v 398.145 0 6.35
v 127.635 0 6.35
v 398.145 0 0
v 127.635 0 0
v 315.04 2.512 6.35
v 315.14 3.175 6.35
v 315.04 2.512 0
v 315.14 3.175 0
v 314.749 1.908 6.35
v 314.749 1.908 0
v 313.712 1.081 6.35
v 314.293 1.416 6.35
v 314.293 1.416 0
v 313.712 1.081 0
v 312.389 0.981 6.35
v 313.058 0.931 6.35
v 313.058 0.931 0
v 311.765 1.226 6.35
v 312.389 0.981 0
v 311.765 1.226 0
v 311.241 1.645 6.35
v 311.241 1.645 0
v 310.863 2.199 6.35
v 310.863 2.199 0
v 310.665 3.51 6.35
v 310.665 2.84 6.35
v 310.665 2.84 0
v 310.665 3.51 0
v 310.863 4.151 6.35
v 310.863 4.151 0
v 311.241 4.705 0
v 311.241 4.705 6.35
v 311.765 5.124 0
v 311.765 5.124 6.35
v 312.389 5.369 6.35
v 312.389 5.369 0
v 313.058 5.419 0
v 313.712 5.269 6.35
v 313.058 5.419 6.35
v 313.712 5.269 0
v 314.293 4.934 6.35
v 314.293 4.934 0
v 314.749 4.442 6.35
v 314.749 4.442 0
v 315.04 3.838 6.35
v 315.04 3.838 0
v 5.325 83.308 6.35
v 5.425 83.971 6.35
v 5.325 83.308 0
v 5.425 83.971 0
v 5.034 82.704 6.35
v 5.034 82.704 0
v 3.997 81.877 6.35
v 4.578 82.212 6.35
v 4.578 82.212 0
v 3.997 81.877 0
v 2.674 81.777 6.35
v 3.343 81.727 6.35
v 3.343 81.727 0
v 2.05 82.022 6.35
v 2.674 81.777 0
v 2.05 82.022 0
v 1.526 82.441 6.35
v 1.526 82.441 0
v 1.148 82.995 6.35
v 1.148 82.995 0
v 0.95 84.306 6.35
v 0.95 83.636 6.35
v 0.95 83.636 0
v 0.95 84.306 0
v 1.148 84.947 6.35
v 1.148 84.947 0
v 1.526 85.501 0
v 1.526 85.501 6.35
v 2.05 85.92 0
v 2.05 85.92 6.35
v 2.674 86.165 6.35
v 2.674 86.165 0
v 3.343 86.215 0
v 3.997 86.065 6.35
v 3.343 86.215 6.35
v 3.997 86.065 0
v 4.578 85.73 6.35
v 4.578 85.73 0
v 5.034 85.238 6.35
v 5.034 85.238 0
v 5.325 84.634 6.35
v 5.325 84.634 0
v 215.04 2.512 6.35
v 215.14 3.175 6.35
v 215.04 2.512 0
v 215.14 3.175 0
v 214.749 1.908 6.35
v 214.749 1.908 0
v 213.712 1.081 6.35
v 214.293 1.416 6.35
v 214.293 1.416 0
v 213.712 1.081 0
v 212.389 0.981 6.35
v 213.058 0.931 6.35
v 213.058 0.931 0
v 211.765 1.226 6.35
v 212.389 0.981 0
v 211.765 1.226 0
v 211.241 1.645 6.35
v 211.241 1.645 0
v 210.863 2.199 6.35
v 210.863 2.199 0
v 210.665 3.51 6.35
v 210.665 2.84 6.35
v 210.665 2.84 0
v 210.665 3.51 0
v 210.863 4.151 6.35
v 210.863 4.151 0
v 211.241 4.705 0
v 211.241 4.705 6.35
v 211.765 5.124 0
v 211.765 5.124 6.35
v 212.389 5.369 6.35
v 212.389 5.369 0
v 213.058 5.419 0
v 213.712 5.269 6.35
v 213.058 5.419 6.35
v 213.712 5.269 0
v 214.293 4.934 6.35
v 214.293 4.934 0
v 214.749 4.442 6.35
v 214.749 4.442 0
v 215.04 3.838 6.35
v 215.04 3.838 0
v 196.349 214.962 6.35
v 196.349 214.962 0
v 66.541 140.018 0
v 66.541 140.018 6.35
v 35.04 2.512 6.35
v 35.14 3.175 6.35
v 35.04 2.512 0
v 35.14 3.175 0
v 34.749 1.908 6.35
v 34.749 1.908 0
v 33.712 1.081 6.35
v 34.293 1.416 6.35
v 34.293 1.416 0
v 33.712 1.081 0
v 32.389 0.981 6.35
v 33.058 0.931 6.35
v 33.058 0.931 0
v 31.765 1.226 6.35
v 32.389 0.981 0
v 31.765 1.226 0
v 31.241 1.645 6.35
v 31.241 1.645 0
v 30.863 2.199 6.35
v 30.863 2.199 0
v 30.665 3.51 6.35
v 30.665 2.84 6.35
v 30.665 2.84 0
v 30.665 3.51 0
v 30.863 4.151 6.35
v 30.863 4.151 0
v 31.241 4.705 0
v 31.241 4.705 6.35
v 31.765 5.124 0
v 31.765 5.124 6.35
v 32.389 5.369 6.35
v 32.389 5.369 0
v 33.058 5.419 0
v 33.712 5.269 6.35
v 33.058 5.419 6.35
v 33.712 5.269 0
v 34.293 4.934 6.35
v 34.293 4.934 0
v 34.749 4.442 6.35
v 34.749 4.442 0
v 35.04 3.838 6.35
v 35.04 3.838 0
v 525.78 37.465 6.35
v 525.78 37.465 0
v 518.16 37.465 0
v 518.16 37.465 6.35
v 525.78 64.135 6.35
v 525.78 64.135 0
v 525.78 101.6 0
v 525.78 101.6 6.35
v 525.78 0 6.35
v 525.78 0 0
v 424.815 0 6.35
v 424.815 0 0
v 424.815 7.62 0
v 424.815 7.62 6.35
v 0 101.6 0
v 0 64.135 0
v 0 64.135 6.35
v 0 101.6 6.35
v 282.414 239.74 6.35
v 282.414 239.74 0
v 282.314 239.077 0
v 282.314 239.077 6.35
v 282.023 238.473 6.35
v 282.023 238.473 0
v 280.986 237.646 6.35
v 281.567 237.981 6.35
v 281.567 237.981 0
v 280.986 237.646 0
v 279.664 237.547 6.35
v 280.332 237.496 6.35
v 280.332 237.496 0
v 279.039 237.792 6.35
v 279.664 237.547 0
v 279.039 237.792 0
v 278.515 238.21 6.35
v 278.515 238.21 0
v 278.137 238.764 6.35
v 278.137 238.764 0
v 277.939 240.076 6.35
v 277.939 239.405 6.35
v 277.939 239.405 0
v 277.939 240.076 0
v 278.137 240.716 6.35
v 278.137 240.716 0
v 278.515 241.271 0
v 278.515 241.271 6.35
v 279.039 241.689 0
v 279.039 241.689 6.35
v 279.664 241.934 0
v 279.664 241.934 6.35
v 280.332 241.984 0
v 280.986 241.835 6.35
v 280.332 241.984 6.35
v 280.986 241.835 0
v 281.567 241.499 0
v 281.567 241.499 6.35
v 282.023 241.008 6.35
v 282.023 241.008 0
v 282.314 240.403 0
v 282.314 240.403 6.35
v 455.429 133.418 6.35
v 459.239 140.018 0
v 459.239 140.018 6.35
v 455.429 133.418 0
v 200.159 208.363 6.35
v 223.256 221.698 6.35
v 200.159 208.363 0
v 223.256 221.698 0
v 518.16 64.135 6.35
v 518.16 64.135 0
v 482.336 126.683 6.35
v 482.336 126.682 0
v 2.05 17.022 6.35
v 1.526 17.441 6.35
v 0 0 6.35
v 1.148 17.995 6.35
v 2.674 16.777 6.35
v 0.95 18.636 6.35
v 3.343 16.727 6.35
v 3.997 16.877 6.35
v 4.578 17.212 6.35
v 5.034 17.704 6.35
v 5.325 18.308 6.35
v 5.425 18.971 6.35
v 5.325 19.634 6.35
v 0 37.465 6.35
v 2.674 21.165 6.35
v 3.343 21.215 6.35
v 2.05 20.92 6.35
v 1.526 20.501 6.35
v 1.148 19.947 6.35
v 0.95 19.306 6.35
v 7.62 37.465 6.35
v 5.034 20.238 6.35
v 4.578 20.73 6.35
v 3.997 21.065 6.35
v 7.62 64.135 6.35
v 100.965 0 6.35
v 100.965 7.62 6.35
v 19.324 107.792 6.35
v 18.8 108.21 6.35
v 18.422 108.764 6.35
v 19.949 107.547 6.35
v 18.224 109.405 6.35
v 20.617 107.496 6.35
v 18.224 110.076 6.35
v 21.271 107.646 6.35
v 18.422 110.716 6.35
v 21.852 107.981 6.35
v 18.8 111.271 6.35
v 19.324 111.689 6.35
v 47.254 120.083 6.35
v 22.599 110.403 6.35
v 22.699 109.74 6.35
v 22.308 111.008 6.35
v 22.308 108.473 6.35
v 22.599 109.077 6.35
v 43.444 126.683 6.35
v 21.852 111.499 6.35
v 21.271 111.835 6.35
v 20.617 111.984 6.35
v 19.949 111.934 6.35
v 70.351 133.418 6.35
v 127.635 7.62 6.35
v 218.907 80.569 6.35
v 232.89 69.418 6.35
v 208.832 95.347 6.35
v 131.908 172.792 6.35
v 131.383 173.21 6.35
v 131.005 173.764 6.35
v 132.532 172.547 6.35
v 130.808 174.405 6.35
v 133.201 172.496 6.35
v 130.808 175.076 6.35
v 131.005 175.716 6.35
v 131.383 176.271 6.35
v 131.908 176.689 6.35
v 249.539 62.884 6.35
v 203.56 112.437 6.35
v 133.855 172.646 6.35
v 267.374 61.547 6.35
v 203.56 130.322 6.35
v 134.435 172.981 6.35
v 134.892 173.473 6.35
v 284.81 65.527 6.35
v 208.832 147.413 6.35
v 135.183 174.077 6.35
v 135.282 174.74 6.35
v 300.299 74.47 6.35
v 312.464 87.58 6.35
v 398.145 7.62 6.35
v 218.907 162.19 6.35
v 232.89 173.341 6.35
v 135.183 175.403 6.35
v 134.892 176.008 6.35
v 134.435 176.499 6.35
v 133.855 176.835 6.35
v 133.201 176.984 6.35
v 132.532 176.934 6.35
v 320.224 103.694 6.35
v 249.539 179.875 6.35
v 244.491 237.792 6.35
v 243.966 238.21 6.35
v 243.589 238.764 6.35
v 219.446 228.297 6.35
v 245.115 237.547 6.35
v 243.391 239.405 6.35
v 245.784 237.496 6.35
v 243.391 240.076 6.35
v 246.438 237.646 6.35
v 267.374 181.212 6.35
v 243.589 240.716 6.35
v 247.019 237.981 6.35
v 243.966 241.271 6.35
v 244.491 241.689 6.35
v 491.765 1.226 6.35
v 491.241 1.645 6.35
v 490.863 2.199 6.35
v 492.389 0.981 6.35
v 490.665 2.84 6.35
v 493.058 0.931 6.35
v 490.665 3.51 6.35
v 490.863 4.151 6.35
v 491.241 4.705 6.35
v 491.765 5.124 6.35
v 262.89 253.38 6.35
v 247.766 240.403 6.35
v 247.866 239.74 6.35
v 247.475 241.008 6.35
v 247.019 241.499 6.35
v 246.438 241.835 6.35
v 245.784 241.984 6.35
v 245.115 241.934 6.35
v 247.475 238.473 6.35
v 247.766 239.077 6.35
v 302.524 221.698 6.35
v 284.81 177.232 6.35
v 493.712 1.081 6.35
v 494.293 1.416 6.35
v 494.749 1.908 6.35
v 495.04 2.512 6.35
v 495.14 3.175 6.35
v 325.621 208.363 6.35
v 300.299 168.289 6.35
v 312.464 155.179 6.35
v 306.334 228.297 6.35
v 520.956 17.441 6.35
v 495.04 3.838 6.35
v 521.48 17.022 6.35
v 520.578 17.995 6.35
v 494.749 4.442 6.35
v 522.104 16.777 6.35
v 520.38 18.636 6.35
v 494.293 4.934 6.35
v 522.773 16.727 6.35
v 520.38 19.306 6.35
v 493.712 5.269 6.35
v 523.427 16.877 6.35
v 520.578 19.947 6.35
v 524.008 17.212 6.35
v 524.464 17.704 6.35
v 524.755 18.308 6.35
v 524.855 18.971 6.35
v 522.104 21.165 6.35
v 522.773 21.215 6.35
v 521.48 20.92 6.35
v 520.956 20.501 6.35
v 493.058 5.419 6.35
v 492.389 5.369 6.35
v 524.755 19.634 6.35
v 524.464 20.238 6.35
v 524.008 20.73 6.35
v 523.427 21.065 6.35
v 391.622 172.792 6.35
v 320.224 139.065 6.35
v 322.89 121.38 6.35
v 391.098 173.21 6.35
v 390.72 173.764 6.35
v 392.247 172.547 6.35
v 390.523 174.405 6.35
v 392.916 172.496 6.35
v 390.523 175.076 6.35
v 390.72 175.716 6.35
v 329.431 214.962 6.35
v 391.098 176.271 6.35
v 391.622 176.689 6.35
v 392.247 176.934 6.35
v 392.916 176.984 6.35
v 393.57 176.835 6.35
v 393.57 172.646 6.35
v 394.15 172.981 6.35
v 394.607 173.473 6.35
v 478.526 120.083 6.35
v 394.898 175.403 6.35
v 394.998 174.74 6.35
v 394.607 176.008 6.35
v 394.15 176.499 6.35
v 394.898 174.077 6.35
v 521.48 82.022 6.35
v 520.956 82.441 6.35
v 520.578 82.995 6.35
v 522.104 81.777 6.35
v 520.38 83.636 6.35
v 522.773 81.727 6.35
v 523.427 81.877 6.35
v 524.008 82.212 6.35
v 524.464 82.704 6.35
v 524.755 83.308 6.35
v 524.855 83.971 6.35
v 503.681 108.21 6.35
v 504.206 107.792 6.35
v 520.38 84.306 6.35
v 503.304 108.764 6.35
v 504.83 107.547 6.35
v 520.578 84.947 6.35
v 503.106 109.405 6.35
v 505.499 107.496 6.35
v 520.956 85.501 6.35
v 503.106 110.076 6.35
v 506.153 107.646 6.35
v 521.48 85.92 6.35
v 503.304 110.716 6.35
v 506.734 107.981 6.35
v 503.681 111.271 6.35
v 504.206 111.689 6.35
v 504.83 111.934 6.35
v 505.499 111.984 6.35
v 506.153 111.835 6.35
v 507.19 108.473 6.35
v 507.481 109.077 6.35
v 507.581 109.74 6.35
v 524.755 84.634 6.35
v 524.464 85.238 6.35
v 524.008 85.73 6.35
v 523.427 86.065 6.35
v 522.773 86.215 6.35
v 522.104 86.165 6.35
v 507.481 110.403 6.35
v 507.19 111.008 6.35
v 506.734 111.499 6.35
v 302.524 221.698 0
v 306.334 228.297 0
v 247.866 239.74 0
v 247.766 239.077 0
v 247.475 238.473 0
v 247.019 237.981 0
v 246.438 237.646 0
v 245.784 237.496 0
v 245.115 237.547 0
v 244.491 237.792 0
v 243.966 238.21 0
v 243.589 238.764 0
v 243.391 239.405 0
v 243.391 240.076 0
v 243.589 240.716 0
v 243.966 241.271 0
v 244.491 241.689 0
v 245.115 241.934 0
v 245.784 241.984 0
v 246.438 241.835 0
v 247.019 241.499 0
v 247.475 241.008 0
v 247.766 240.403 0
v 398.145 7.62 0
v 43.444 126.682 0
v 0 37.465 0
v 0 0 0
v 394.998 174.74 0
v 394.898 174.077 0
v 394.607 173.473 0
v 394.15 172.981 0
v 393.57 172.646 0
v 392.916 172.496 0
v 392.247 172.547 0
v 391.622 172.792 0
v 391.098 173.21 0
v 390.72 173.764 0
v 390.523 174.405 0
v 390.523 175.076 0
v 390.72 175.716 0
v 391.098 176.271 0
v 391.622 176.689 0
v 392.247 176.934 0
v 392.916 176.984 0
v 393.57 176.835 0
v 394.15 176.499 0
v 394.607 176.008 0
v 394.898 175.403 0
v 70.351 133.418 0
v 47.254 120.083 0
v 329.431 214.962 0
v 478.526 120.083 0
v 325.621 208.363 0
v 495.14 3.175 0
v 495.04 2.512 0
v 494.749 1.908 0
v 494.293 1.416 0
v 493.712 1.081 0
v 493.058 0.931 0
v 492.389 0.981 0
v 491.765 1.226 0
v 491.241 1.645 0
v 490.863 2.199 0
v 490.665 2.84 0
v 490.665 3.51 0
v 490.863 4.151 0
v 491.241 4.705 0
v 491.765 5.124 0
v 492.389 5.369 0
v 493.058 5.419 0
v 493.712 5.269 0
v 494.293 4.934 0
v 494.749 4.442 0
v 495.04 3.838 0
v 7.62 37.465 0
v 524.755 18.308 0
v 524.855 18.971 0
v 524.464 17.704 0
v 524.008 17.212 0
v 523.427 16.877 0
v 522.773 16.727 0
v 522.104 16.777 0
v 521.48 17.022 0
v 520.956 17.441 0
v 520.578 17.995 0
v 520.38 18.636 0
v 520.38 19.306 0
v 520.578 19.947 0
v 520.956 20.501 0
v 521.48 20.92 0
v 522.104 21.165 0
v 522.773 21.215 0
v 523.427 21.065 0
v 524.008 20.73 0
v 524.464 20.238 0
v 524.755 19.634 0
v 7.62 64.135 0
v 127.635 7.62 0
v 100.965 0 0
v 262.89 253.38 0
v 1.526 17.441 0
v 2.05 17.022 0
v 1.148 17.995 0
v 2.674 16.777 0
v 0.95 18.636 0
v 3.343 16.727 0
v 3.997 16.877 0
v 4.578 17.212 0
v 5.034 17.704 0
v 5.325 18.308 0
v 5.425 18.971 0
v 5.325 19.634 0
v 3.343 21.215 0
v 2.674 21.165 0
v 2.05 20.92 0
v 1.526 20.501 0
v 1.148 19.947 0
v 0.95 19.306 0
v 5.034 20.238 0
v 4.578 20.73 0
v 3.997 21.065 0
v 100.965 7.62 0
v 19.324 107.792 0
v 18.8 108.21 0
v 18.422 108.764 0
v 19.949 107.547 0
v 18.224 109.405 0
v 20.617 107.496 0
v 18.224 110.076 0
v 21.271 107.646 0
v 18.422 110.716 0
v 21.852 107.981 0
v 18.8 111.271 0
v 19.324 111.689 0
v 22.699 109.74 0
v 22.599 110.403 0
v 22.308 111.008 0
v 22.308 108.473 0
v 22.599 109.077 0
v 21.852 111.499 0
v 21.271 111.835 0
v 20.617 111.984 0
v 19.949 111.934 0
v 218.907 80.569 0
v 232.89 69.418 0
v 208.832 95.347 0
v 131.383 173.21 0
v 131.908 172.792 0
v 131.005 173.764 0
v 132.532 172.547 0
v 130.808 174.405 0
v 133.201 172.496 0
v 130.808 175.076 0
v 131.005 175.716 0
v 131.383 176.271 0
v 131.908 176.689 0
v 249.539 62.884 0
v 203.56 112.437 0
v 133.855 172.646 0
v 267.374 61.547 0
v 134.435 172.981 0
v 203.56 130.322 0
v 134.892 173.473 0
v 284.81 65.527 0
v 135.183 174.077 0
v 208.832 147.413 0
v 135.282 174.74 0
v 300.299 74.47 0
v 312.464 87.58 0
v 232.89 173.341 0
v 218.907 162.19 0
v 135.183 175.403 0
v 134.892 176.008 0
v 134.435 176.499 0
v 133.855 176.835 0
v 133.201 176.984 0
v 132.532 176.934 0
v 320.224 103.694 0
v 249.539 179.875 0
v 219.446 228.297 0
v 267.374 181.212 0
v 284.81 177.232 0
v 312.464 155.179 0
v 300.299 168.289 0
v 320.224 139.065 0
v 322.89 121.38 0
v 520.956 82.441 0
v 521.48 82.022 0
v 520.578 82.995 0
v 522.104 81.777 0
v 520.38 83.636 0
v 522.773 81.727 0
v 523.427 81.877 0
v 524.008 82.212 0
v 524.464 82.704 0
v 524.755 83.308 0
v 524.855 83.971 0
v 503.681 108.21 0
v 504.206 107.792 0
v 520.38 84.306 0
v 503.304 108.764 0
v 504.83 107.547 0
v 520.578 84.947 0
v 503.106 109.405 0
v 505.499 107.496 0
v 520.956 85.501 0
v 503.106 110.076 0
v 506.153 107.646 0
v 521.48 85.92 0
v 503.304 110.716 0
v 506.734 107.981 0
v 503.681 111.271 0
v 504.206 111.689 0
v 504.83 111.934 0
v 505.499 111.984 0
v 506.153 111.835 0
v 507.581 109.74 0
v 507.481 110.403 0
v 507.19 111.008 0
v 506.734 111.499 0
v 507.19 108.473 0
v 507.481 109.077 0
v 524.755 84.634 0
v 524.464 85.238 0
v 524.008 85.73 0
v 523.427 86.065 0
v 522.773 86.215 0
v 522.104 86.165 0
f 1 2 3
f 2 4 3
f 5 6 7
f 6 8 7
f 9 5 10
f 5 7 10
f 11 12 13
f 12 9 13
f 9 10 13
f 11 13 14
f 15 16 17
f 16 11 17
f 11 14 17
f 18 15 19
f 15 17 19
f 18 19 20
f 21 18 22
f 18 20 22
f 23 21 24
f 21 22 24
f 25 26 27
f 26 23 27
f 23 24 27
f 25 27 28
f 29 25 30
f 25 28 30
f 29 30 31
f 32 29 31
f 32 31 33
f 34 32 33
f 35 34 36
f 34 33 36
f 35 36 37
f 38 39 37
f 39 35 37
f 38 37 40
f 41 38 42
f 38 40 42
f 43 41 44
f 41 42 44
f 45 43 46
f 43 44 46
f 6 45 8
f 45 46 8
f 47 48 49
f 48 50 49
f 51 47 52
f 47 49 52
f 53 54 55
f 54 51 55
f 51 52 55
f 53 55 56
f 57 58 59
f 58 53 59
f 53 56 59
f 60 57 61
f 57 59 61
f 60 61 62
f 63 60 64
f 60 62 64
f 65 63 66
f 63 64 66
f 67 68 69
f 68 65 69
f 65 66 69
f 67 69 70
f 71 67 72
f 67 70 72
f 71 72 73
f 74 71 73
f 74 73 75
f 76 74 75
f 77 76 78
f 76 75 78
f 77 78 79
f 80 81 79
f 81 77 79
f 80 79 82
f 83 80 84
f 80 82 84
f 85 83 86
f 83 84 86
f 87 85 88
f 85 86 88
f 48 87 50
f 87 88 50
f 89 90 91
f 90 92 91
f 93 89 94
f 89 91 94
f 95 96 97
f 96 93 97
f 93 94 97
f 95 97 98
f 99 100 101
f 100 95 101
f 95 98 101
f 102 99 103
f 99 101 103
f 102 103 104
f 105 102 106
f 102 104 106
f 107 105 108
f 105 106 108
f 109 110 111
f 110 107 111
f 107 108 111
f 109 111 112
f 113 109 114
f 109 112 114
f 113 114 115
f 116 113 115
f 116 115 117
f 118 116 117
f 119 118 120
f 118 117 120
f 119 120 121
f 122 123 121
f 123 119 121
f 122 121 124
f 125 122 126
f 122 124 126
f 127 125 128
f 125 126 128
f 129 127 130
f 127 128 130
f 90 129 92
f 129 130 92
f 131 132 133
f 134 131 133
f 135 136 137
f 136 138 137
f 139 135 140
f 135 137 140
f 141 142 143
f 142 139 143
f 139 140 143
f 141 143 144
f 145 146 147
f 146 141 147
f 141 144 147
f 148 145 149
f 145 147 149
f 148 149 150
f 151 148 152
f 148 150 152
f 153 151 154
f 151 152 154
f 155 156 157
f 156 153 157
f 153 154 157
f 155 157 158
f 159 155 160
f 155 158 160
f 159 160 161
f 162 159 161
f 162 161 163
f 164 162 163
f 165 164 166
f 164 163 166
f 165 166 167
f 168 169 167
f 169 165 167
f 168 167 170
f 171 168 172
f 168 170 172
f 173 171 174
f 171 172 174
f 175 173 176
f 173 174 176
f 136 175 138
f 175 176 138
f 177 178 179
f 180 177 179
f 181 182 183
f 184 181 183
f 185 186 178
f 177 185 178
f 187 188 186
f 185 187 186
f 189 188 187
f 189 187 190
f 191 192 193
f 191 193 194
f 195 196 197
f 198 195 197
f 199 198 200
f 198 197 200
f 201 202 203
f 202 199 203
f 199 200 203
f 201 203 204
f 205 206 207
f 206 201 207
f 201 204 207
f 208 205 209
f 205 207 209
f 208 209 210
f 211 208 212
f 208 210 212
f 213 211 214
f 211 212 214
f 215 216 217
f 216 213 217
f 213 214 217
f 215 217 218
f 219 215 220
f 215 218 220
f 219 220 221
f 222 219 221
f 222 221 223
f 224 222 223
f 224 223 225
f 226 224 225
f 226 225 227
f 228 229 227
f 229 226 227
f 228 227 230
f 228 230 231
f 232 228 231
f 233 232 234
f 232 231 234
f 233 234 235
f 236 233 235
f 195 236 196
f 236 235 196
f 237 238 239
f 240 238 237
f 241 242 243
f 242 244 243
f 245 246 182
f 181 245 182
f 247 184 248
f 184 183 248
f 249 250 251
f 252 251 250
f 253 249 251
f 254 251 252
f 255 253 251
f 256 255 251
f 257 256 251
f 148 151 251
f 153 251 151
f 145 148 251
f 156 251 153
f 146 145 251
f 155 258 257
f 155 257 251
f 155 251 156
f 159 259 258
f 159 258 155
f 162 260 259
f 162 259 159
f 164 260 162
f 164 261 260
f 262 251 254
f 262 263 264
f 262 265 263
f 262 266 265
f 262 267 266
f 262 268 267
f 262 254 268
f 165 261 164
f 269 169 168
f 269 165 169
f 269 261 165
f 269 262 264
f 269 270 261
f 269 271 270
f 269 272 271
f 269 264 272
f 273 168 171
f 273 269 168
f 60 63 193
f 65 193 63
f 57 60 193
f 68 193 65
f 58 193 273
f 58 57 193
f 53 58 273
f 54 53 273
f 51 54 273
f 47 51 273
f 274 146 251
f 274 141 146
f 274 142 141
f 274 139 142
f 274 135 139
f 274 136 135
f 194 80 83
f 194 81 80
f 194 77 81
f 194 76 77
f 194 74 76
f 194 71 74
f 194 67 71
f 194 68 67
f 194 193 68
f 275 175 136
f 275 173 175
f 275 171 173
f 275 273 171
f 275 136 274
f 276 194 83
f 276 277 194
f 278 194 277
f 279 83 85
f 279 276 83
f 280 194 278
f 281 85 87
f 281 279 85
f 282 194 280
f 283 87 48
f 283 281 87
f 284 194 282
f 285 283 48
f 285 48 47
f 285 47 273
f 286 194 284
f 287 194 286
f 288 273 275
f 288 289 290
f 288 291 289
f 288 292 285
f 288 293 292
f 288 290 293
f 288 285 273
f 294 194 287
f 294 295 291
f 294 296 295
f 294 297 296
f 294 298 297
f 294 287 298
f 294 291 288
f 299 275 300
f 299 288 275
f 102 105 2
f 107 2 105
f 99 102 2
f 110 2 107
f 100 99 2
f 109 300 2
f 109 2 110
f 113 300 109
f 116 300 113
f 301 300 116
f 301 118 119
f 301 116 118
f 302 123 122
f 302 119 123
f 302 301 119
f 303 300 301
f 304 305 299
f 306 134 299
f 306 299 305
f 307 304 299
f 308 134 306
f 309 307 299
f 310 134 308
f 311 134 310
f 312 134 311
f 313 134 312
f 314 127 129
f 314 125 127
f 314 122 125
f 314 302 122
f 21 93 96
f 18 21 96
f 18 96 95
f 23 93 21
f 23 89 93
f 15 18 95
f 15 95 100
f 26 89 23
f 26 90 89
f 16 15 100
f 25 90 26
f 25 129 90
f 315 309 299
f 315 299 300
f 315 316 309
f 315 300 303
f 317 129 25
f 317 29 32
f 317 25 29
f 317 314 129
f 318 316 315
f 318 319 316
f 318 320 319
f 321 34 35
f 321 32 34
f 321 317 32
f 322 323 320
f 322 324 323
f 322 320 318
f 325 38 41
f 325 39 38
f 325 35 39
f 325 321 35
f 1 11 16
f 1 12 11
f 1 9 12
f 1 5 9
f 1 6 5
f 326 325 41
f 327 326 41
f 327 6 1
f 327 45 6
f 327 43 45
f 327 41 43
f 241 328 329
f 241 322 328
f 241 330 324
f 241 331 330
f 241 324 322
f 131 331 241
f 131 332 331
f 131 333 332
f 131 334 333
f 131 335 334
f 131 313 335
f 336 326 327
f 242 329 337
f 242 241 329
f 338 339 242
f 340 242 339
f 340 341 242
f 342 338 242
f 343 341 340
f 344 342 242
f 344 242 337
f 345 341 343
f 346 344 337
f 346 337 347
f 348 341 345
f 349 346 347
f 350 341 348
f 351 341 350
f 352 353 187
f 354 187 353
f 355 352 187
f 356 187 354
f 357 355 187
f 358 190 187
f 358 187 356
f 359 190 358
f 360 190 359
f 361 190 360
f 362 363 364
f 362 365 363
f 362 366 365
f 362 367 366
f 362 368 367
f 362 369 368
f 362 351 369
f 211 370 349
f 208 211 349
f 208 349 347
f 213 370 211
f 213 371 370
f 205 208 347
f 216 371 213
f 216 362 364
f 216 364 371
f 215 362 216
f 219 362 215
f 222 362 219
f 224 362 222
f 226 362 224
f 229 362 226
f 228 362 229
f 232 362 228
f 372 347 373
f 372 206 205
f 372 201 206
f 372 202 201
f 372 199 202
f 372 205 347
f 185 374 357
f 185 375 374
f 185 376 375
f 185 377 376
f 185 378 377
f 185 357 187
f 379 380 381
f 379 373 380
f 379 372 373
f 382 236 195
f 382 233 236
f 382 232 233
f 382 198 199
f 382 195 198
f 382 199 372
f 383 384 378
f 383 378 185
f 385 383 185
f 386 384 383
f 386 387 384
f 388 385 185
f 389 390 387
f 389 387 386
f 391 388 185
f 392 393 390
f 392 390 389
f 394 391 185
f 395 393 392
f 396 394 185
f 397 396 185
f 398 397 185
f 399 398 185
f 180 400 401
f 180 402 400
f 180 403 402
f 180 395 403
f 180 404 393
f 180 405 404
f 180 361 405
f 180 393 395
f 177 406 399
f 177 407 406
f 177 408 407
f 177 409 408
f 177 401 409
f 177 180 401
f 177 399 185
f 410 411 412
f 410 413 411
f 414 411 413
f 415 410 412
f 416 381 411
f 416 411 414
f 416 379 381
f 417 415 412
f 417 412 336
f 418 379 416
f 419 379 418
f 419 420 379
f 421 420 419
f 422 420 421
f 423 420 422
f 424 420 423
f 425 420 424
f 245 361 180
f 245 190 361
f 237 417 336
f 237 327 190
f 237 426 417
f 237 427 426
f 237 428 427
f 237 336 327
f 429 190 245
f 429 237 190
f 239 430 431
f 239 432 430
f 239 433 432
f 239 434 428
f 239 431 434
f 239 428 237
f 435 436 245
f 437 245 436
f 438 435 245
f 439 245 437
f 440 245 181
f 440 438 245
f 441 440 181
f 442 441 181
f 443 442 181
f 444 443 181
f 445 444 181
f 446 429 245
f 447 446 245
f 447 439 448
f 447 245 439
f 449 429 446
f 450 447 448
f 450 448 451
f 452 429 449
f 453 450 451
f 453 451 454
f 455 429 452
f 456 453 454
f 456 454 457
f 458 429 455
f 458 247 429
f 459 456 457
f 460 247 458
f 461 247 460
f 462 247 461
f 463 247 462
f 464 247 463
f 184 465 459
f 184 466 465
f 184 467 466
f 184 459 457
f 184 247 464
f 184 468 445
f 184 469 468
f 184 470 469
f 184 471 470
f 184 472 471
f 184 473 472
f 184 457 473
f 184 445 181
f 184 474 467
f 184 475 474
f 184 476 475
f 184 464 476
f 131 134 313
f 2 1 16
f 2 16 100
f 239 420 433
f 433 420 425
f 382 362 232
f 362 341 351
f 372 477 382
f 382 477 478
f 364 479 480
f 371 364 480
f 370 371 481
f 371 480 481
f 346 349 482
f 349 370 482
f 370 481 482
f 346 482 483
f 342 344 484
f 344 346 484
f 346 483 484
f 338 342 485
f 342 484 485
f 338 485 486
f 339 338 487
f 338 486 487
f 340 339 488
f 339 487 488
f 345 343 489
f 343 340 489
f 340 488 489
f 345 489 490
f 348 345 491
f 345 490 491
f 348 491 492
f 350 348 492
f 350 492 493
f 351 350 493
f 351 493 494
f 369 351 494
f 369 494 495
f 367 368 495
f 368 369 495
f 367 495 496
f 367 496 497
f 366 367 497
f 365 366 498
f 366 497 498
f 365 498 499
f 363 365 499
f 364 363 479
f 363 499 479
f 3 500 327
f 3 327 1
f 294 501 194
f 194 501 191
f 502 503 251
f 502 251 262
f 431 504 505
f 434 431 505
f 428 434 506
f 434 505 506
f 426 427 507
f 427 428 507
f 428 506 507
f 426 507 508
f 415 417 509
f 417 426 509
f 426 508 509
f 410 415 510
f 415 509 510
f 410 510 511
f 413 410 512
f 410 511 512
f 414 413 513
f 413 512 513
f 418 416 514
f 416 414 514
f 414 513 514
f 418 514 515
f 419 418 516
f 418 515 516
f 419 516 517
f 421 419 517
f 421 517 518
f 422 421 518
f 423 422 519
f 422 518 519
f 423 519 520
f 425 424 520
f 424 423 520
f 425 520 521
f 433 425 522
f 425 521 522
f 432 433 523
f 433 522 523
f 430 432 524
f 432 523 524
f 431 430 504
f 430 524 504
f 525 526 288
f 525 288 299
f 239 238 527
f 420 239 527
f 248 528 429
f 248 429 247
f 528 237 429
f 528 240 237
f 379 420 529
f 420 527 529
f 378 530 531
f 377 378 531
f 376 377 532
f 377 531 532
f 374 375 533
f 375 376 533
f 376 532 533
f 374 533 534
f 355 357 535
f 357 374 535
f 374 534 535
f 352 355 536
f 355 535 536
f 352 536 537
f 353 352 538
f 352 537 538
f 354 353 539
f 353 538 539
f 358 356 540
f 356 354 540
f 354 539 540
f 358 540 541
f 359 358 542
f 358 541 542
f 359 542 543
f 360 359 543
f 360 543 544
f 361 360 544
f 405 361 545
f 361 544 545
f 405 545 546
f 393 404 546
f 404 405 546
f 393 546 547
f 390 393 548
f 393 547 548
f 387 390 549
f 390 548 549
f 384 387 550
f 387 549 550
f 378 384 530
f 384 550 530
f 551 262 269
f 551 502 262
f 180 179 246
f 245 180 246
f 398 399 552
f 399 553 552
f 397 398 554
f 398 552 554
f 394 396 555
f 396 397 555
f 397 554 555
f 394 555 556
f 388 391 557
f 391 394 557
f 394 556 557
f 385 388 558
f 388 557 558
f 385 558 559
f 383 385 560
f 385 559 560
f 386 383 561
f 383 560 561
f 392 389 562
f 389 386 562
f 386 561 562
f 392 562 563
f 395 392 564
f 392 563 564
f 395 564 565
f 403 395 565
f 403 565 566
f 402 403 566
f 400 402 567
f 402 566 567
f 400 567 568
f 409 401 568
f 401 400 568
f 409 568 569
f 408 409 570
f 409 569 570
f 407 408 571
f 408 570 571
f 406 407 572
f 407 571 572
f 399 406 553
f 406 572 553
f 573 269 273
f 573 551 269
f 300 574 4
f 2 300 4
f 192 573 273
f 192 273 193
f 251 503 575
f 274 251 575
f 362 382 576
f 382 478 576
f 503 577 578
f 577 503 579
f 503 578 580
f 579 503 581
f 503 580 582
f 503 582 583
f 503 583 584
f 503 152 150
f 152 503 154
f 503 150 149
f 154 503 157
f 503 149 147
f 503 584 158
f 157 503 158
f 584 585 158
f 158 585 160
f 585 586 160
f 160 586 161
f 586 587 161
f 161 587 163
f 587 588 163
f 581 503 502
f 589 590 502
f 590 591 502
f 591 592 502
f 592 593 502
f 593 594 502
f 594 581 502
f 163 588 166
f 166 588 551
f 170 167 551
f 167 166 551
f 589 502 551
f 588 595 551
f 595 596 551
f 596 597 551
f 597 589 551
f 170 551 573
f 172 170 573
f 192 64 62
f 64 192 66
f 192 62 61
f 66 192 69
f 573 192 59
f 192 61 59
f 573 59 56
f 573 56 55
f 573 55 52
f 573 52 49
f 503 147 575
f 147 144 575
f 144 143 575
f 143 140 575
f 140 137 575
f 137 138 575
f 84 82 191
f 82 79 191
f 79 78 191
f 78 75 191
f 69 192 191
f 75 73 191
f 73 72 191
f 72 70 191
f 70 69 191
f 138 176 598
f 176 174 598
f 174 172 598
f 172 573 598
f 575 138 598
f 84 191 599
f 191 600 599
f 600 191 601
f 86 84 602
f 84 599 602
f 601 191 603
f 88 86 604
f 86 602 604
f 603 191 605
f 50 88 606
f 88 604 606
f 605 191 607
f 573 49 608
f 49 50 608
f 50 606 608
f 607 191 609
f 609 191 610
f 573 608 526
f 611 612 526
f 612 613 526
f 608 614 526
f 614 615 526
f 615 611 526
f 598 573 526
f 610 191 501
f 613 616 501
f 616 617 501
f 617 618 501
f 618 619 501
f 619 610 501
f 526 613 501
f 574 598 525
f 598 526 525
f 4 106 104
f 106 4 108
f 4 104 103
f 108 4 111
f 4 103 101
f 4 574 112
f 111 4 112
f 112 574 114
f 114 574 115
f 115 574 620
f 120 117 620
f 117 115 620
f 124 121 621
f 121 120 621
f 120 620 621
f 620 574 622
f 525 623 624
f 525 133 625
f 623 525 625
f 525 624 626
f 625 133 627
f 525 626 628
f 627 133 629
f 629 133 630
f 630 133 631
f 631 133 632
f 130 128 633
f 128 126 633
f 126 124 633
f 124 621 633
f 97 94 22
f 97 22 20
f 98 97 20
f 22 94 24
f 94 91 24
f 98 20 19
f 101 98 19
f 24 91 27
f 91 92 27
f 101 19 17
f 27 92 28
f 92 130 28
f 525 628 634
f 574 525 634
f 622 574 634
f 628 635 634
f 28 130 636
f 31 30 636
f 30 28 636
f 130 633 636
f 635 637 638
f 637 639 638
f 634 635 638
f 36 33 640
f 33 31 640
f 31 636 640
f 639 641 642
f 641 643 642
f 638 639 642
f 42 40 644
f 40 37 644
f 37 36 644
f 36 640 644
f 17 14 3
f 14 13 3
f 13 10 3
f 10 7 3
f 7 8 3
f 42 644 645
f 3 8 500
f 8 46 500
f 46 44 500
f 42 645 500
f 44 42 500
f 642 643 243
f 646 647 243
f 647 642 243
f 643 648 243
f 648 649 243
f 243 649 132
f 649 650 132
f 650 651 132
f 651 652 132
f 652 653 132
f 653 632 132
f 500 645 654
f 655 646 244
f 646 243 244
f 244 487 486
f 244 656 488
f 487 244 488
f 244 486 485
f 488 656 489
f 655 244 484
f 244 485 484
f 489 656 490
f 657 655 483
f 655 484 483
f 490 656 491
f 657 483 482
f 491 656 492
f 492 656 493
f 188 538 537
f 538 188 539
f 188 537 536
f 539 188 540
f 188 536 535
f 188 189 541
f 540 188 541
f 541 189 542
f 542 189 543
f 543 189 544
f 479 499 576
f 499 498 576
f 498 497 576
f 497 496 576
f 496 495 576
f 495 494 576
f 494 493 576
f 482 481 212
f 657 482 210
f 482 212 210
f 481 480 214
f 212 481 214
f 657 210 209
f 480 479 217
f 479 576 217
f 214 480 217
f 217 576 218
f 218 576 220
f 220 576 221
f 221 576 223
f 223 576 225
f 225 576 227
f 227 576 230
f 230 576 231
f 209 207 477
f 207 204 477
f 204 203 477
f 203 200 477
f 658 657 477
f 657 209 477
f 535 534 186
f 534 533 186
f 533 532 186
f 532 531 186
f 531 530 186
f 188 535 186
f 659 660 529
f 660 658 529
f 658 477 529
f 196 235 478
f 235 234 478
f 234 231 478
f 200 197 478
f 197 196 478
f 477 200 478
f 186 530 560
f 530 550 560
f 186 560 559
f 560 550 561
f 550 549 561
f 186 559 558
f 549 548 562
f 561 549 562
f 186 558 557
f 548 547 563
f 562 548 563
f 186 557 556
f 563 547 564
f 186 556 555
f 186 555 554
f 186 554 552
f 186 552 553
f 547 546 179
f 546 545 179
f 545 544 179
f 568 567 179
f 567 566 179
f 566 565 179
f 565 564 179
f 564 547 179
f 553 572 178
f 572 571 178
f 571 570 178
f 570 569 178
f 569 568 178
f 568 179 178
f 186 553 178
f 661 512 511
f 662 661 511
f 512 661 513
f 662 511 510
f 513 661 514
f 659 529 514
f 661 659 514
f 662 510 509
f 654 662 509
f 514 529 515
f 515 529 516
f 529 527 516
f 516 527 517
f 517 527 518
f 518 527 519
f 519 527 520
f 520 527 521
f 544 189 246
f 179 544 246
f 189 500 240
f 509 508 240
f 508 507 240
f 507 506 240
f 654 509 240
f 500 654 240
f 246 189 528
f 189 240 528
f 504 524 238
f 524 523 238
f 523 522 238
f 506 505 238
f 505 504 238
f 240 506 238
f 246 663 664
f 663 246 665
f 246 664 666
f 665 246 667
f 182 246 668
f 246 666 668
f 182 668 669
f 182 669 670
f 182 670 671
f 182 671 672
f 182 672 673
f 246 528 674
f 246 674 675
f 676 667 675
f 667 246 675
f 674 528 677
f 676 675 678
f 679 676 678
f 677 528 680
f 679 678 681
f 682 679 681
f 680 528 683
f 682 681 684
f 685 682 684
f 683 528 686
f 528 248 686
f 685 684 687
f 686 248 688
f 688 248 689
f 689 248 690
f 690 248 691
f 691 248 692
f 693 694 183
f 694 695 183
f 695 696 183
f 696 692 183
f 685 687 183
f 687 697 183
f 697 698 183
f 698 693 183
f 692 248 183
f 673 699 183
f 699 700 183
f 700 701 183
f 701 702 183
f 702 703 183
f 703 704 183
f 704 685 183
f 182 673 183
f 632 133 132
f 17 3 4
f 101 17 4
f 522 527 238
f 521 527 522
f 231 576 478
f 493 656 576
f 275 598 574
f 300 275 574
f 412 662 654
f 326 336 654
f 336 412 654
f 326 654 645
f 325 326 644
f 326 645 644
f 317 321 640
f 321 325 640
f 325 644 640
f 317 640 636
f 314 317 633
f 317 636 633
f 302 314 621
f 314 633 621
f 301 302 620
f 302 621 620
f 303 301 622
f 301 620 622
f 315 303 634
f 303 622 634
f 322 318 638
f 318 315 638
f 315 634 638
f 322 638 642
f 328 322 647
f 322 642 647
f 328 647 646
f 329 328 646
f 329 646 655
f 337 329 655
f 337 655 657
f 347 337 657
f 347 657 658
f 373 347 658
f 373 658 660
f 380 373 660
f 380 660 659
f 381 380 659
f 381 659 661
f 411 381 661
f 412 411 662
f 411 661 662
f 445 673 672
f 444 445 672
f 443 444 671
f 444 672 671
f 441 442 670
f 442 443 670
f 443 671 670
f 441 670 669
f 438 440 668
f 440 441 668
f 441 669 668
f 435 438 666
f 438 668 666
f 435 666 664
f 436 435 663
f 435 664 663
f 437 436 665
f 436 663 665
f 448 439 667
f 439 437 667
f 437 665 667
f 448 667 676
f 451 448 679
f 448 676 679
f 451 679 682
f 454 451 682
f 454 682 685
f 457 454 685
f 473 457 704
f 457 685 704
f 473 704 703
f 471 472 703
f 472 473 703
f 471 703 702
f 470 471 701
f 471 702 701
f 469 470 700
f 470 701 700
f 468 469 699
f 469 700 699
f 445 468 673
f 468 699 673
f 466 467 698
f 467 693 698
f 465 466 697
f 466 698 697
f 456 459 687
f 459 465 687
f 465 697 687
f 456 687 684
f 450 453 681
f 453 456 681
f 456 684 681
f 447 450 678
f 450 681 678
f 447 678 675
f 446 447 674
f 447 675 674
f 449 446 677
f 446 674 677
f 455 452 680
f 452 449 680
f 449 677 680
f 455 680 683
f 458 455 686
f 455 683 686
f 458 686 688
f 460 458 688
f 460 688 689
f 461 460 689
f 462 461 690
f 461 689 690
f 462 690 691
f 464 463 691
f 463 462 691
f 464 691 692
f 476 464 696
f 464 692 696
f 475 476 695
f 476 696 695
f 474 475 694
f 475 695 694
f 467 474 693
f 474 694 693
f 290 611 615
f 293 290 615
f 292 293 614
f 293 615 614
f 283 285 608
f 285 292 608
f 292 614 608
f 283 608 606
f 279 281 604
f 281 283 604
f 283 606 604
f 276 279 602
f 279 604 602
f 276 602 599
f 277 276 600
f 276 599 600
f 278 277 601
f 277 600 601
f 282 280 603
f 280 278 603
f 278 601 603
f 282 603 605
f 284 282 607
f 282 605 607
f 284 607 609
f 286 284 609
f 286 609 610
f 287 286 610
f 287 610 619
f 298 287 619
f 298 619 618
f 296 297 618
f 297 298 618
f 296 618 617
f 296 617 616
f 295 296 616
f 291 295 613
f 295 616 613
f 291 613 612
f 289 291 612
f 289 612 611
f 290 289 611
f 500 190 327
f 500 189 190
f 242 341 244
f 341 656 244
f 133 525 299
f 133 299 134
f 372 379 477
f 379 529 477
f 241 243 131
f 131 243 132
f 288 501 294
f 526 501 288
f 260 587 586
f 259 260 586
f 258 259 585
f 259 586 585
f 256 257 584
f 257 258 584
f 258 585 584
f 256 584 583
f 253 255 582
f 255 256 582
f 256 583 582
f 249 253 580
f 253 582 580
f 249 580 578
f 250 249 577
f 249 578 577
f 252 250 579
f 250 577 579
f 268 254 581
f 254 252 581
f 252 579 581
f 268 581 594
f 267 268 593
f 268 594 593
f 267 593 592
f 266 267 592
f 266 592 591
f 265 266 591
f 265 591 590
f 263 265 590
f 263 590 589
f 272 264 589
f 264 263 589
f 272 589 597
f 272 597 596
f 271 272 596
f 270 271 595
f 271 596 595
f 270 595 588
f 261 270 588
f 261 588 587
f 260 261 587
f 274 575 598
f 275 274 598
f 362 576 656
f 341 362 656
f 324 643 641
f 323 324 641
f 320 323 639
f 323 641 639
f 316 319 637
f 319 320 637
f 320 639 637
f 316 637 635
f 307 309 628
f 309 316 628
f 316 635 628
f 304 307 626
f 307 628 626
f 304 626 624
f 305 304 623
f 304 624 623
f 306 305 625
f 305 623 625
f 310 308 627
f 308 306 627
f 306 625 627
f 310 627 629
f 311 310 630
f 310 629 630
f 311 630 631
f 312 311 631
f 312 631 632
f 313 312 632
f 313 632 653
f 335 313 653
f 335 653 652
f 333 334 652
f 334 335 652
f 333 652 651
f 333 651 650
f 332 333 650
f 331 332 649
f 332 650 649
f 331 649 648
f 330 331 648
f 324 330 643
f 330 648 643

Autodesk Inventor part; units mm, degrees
ref_plane "YZ Plane" through (0, 0, 0) normal (1, 0, 0) x (0, 1, 0)
ref_plane "XZ Plane" through (0, 0, 0) normal (0, 1, 0) x (-1, 0, 0)
sketch "Sketch1" plane through (0, 0, 0) normal (0, 0, 1) x (1, 0, 0)
  line L0 (0, 0) -> (0, 101.6)
  line L1 (0, 0) -> (525.78, 0)
  line L2 (525.78, 0) -> (525.78, 101.6)
  line L3 (525.78, 101.6) -> (262.89, 253.3796)
  line L4 (262.89, 253.3796) -> (0, 101.6)
  circle A0 centre (262.89, 121.3796) radius 60
  line L5 (3.175, 99.7669) -> (3.175, 3.175) construction
  line L6 (3.175, 3.175) -> (522.605, 3.175) construction
  line L7 (522.605, 3.175) -> (522.605, 99.7669) construction
  line L8 (522.605, 99.7669) -> (262.89, 249.7134) construction
  line L9 (262.89, 249.7134) -> (3.175, 99.7669) construction
  line L10 (6.35, 97.9338) -> (6.35, 6.35) construction
  line L11 (6.35, 6.35) -> (519.43, 6.35) construction
  line L12 (519.43, 6.35) -> (519.43, 97.9338) construction
  line L13 (519.43, 97.9338) -> (262.89, 246.0473) construction
  line L14 (262.89, 246.0473) -> (6.35, 97.9338) construction
  circle A1 centre (3.175, 83.971) radius 2.25
  circle A2 centre (3.175, 18.971) radius 2.25
  line L15 (3.175, 83.971) -> (3.175, 18.971) construction
  circle A3 centre (32.89, 3.175) radius 2.25
  circle A4 centre (212.89, 3.175) radius 2.25
  circle A5 centre (312.89, 3.175) radius 2.25
  circle A6 centre (492.89, 3.175) radius 2.25
  line L16 (32.89, 3.175) -> (492.89, 3.175) construction
  line L17 (212.89, 3.175) -> (312.89, 3.175) construction
  line L18 (20.4492, 109.7402) -> (245.6158, 239.7402) construction
  circle A7 centre (20.4492, 109.7402) radius 2.25
  circle A8 centre (245.6158, 239.7402) radius 2.25
  line L19 (262.89, 0) -> (262.89, 253.3796) construction
  circle A9 centre (522.605, 83.971) radius 2.25
  circle A10 centre (522.605, 18.971) radius 2.25
  circle A11 centre (505.3308, 109.7402) radius 2.25
  circle A12 centre (280.1642, 239.7402) radius 2.25
  circle A13 centre (133.0325, 174.7402) radius 2.25
  circle A14 centre (392.7475, 174.7402) radius 2.25
  point P0 (3.175, 51.471)
  point P1 (3.175, 51.471)
  point P2 (262.89, 3.175)
  point P3 (262.89, 3.175)
  point P4 (262.89, 3.175)
  dimension "d0" = 101.6
  dimension "d1" = 525.78
  dimension "d2" = 120
  dimension "d3" = 120
  dimension "d4" = 121.3796
  dimension "d5" = 3.175
  dimension "d6" = 3.175
  dimension "d7" = 4.5
  dimension "d8" = 4.5
  dimension "d9" = 65
  dimension "d10" = 4.5
  dimension "d11" = 4.5
  dimension "d12" = 4.5
  dimension "d13" = 4.5
  dimension "d14" = 460
  dimension "d15" = 100
  dimension "d16" = 4.5
  dimension "d17" = 4.5
  dimension "d18" = 260
  dimension "d33" = 4.5
  dimension "d34" = 4.5
extrude "Extrusion1" add sketch "Sketch1" along normal blind 6.35
sketch "Sketch2" plane through (0, 0, 0) normal (0, 0, -1) x (-1, 0, 0)
  line L0 (-100.965, 7.62) -> (-127.635, 7.62)
  line L1 (-127.635, 7.62) -> (-127.635, 0)
  line L2 (-127.635, 0) -> (-100.965, 0)
  line L3 (-100.965, 0) -> (-100.965, 7.62)
  line L4 (-525.78, 0) -> (0, 0) projected
  line L5 (0, 0) -> (0, 101.6) projected
  line L6 (0, 0) -> (-525.78, 0) projected
  line L7 (-262.89, 0) -> (-262.89, -49.0023)
  line L8 (-424.815, 7.62) -> (-398.145, 7.62)
  line L9 (-398.145, 7.62) -> (-398.145, 0)
  line L10 (-398.145, 0) -> (-424.815, 0)
  line L11 (-424.815, 0) -> (-424.815, 7.62)
  line L12 (0, 0) -> (-525.78, 0)
  line L13 (-525.78, 0) -> (0, 0)
  line L14 (0, 101.6) -> (0, 0) projected
  line L15 (0, 37.465) -> (-7.62, 37.465)
  line L16 (-7.62, 37.465) -> (-7.62, 64.135)
  line L17 (-7.62, 64.135) -> (0, 64.135)
  line L18 (0, 64.135) -> (0, 37.465)
  line L19 (-525.78, 0) -> (-525.78, 101.6)
  line L20 (-525.78, 101.6) -> (-525.78, 0)
  line L21 (-525.78, 37.465) -> (-518.16, 37.465)
  line L22 (-518.16, 37.465) -> (-518.16, 64.135)
  line L23 (-518.16, 64.135) -> (-525.78, 64.135)
  line L24 (-525.78, 64.135) -> (-525.78, 37.465)
  point P0 (0, 50.8)
  point P1 (-525.78, 50.8)
  dimension "d21" = 26.67
  dimension "d22" = 7.62
  dimension "d23" = 100.965
  dimension "d26" = 7.62
  dimension "d27" = 26.67
extrude "Extrusion2" cut sketch "Sketch2" against normal through all
sketch "Sketch3" plane through (0, 0, 0) normal (0, 0, -1) x (-1, 0, 0)
  line L0 (0, 101.6) -> (-262.89, 253.3796) projected
  line L1 (-43.4442, 126.6825) -> (-47.2542, 120.0834)
  line L2 (-47.2542, 120.0834) -> (-70.3511, 133.4184)
  line L3 (-70.3511, 133.4184) -> (-66.5411, 140.0175)
  line L4 (-66.5411, 140.0175) -> (-43.4442, 126.6825)
  line L5 (-131.445, 177.4898) -> (-144.4004, 155.0504)
  line L6 (-262.89, 253.3796) -> (0, 101.6)
  line L7 (-219.4458, 228.2971) -> (-223.2558, 221.698)
  line L8 (-223.2558, 221.698) -> (-200.1589, 208.363)
  line L9 (-200.1589, 208.363) -> (-196.3489, 214.9621)
  line L10 (-196.3489, 214.9621) -> (-219.4458, 228.2971)
  point P0 (0, 0)
  dimension "d28" = 7.62
  dimension "d29" = 26.67
  dimension "d30" = 50.165
extrude "Extrusion3" cut sketch "Sketch3" against normal through all
ref_plane "Work Plane1" through (262.89, 0, 0) normal (-1, 0, 0) x (0, 0, 1)
mirror "Mirror1" about plane through (262.89, 0, 0) normal (-1, 0, 0) of "Extrusion3"
equation "\"d5\" = 0.5 * d19"
equation "\"d6\" = 0.5 * d19"
equation "\"d19\" = Panel_Thickness"
equation "\"d22\" = Panel_Thickness + Fit_Tolerance"
equation "\"d26\" = Panel_Thickness + Fit_Tolerance"
equation "\"d28\" = Panel_Thickness + Fit_Tolerance"
equation "\"Fit_Tolerance\" = 1.27"
equation "\"Panel_Thickness\" = 6.35"
equation "\"Tool_Dia\" = 6.35"
properties part number "BA01" material "Polyethylene, High Density"
